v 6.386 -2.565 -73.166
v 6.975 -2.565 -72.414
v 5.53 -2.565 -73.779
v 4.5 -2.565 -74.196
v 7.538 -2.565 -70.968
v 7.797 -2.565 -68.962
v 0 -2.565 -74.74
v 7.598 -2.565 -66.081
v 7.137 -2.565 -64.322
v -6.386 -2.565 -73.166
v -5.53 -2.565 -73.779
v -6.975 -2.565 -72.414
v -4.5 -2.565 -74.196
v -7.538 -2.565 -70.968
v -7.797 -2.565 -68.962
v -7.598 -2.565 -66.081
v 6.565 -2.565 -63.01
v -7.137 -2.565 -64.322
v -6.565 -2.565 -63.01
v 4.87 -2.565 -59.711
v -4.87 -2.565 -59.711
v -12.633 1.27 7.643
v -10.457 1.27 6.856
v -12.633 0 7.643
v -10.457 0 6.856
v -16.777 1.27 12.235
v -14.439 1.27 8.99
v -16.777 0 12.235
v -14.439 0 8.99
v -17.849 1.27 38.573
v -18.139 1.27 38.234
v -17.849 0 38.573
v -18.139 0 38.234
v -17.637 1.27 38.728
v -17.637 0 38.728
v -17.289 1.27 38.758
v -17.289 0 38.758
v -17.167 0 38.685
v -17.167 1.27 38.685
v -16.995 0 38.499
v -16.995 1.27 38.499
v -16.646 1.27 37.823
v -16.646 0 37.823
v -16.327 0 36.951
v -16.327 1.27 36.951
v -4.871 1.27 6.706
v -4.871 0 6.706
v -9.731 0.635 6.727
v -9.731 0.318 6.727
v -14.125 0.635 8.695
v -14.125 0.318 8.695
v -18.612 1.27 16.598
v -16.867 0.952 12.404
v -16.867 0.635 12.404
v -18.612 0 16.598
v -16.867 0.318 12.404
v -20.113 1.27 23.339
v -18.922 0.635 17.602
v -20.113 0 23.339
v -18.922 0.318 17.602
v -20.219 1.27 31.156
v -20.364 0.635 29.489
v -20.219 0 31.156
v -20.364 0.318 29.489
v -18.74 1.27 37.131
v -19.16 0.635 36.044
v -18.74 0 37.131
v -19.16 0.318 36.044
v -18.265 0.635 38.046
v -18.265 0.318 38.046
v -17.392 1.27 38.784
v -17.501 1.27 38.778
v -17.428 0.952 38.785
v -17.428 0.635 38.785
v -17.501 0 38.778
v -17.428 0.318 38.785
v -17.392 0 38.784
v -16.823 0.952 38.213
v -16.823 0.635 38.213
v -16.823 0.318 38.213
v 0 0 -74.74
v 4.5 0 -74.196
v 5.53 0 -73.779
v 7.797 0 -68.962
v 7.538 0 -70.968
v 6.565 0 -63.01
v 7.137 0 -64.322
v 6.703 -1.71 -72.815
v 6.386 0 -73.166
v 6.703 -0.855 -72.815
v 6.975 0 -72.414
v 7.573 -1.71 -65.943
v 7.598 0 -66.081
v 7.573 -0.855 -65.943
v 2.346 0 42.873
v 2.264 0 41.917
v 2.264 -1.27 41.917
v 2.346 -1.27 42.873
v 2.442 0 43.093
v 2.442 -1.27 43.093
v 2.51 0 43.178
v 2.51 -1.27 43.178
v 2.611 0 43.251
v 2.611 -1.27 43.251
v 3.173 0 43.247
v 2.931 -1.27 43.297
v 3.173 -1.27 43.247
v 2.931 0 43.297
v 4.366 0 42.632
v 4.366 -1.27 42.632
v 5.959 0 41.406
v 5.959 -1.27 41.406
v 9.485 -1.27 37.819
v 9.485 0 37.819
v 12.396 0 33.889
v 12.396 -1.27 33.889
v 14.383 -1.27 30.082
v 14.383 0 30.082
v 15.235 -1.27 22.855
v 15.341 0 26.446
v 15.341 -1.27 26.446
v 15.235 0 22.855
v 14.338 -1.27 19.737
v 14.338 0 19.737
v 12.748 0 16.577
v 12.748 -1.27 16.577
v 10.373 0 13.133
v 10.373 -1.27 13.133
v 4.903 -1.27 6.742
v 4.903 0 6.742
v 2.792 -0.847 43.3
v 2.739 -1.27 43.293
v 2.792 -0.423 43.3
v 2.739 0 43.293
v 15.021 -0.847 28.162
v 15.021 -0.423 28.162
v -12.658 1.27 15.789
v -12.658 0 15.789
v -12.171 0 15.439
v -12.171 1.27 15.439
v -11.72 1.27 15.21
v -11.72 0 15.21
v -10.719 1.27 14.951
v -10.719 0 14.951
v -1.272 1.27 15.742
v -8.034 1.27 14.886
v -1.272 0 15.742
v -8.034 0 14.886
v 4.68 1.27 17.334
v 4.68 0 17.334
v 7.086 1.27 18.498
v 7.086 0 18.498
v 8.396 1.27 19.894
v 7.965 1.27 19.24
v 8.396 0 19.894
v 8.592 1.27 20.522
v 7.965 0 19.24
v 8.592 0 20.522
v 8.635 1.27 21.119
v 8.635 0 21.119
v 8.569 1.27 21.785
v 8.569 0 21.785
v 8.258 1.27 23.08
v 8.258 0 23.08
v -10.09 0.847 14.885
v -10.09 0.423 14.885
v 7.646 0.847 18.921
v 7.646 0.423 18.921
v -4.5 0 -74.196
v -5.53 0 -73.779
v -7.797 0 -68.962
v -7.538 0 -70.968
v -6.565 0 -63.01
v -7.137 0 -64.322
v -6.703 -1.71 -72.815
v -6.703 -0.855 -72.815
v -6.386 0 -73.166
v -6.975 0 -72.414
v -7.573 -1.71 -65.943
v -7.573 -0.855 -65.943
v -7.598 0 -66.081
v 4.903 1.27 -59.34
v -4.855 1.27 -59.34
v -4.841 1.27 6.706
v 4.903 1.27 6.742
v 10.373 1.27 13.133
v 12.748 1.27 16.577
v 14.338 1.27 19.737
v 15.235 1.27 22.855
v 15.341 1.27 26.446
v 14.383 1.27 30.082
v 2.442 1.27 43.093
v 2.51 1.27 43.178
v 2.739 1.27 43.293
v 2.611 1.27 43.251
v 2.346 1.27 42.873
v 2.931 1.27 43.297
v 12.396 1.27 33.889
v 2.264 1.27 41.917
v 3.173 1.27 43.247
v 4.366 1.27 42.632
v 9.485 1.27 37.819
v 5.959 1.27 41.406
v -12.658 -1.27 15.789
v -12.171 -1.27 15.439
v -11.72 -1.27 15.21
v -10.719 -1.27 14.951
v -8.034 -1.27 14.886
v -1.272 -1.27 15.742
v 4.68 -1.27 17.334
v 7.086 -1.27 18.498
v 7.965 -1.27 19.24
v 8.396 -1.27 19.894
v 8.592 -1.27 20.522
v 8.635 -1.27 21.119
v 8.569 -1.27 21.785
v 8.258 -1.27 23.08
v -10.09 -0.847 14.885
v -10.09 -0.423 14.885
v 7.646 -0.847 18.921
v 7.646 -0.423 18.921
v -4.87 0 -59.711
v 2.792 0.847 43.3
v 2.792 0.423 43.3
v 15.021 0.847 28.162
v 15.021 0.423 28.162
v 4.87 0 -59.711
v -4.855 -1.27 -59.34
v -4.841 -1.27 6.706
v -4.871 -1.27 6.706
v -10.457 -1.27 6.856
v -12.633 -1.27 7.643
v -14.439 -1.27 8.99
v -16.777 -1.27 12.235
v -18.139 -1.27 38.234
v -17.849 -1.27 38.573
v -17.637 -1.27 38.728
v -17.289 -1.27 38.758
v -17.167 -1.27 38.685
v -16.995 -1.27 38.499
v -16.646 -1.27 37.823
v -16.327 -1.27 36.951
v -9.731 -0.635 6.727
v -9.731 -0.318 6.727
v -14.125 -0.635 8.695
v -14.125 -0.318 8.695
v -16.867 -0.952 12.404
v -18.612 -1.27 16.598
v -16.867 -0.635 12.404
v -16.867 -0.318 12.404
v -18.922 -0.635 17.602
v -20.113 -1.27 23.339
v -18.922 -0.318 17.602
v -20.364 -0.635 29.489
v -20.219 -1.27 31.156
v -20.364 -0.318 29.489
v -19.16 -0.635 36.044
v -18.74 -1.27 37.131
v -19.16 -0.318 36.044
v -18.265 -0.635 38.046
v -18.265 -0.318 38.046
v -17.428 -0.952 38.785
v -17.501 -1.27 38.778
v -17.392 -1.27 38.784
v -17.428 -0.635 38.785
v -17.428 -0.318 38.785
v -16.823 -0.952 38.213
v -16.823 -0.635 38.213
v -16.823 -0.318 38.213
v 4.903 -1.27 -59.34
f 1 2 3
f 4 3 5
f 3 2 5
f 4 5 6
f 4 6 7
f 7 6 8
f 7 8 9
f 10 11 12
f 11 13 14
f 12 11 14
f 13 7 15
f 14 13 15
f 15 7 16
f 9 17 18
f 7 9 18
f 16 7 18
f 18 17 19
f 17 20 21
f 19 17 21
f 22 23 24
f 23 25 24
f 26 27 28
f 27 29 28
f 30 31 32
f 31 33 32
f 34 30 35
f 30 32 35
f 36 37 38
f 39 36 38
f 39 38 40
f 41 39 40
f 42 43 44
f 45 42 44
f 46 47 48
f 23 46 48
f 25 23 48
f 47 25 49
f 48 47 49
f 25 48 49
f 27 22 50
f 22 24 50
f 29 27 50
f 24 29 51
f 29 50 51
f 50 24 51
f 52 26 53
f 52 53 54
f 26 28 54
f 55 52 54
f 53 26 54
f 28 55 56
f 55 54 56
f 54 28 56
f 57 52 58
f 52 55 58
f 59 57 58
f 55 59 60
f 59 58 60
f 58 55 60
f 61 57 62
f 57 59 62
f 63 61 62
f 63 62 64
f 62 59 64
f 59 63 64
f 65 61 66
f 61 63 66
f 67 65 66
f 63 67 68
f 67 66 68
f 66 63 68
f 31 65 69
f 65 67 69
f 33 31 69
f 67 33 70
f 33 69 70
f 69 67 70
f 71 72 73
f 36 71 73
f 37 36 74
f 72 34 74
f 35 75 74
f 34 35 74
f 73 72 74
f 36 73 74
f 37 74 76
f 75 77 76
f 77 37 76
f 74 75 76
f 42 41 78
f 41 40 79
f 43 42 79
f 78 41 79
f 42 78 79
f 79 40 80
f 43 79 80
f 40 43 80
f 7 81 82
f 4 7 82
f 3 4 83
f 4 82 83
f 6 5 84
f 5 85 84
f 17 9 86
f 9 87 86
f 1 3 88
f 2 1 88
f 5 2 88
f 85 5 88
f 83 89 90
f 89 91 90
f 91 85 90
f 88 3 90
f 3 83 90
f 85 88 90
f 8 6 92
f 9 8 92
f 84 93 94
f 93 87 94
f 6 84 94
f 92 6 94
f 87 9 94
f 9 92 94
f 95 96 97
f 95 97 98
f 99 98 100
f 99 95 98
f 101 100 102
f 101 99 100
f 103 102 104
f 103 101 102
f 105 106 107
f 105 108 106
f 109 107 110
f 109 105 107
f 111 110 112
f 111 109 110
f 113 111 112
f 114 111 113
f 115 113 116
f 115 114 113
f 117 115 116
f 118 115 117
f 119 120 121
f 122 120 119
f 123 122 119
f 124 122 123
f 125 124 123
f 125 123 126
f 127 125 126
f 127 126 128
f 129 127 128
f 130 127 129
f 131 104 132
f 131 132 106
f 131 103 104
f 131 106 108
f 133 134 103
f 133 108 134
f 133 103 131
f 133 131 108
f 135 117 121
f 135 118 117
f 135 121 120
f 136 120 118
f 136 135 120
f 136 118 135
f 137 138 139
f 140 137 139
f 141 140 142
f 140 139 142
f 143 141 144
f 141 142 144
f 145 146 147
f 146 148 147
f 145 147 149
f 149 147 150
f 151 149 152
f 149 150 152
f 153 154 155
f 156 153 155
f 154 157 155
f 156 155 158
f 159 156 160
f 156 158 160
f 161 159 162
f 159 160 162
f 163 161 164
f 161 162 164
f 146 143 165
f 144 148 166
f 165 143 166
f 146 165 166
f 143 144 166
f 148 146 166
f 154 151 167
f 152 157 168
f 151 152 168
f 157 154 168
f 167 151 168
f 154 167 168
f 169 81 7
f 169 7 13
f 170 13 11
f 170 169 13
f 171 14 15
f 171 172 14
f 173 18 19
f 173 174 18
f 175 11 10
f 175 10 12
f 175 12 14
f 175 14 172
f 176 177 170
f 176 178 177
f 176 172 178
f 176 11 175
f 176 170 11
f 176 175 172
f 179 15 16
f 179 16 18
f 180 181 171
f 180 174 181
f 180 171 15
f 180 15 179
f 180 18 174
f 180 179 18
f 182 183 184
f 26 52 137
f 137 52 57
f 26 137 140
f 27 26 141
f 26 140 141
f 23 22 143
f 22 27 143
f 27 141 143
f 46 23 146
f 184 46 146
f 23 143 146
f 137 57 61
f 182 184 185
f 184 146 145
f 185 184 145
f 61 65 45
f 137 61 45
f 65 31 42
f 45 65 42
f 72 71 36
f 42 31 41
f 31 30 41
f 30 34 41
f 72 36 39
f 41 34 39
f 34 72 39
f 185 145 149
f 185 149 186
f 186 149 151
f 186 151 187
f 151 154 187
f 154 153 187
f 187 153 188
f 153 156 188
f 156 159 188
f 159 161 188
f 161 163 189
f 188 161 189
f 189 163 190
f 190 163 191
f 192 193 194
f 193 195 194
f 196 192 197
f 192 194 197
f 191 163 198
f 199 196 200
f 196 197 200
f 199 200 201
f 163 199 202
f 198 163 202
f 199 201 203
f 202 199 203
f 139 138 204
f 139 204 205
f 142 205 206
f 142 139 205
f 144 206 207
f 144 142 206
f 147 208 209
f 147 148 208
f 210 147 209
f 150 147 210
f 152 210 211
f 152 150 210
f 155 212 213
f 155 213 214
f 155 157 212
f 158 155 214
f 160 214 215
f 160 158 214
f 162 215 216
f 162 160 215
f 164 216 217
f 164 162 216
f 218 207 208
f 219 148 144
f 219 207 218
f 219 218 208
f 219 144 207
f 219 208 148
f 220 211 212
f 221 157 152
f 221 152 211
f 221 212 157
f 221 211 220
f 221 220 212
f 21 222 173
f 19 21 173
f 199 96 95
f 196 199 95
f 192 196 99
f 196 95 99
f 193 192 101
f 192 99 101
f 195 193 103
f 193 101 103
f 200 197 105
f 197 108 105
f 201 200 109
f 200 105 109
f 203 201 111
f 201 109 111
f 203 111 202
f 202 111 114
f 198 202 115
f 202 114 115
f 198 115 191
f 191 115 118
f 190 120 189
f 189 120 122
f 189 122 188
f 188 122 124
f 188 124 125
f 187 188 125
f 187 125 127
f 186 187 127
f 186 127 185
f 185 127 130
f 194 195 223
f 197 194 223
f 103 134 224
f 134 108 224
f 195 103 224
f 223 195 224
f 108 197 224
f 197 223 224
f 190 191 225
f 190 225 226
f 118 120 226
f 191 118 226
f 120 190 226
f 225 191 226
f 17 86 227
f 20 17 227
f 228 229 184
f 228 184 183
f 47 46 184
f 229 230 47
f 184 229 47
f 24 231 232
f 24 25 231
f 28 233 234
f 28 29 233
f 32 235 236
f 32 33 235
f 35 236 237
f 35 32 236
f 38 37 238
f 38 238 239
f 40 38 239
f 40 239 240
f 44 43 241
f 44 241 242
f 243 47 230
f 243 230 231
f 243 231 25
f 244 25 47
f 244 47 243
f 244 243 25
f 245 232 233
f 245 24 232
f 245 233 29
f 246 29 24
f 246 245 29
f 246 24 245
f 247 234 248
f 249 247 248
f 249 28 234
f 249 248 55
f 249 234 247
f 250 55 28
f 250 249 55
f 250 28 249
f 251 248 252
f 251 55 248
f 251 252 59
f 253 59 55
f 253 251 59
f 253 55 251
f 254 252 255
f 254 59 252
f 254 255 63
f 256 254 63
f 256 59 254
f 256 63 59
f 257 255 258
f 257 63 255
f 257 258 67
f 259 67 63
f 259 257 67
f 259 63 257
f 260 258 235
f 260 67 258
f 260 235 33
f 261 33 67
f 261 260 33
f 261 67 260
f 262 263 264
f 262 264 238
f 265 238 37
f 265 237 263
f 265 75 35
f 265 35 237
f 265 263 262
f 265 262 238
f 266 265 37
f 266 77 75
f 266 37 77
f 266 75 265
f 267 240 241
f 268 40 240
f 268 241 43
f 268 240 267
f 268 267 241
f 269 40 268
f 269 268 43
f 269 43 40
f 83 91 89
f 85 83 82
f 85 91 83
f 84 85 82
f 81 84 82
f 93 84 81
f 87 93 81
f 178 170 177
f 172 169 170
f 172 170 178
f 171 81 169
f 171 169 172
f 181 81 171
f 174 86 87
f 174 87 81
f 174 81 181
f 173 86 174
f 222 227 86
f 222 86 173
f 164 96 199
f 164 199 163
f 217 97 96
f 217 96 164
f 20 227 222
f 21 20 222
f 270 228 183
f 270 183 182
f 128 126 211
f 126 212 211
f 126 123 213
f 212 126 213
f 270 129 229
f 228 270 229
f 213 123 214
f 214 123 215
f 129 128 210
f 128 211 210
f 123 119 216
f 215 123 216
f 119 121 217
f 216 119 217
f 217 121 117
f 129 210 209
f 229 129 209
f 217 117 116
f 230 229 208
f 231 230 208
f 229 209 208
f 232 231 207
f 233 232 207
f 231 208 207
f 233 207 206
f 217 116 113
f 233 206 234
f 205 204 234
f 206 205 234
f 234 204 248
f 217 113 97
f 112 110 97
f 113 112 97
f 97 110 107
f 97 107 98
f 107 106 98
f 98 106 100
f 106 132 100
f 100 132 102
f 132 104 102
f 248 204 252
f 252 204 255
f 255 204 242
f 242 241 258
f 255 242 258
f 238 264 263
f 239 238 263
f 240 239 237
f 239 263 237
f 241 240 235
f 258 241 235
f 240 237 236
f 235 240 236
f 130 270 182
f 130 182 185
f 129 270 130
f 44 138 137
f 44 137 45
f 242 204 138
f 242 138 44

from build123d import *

# Parameters (mm, degrees)
F0_R     = 4.1276908543
F1_DEPTH = 2.5654
F3_DEPTH = 1.27
F5_DEPTH = 1.27


with BuildPart() as f1:
    # F0 (on Front) → F1 (new body)
    with BuildSketch(Plane.XZ):
        with BuildLine():
            add(Edge.make_bspline(
                [(0, -74.7398287058), (-2.6957496567, -74.6143655928), (-8.0783391659, -74.3638540389), (-7.896167718, -65.7972104685), (-6.9462192909, -63.8078220004), (-6.5654343925, -63.0103796721)],
                knots=[0, 0, 0, 0, 0.3754445557, 0.7496482182, 1, 1, 1, 1], degree=3))
            add(Edge.make_bspline(
                [(0, -74.7398287058), (2.6957496567, -74.6143655928), (8.0783391659, -74.3638540389), (7.896167718, -65.7972104685), (6.9462192909, -63.8078220004), (6.5654343925, -63.0103796721)],
                knots=[0, 0, 0, 0, 0.3754445557, 0.7496482182, 1, 1, 1, 1], degree=3))
            Line((6.5654343925, -63.0103796721), (4.8701618798, -59.7114712))
            Line((4.8701618798, -59.7114712), (-4.8701618798, -59.7114712))
            Line((-4.8701618798, -59.7114712), (-6.5654343925, -63.0103796721))
        make_face()
        with Locations((0, -69.3332850933)):
            Circle(F0_R, mode=Mode.SUBTRACT)
        with Locations((0, -69.3332850933)):
            Circle(F0_R)
    extrude(amount=F1_DEPTH)


with BuildPart() as f3:
    # F2 (on Front) → F3 (new body, symmetric)
    with BuildSketch(Plane.XZ):
        with BuildLine():
            add(Edge.make_bspline(
                [(-4.870638717, 6.7057721317), (-8.1624512163, 6.5038067464), (-16.4394258345, 5.9959824496), (-22.5493572738, 28.3095871952), (-17.6429563519, 40.7485223081), (-16.6454227734, 37.8691800893), (-16.3271799684, 36.950584501)],
                knots=[0, 0, 0, 0, 0.249708204, 0.6278694387, 0.8812793111, 1, 1, 1, 1], degree=3))
            add(Edge.make_bspline(
                [(-4.870638717, 6.7057721317), (-1.623546239, 6.7057721317), (1.623546239, 6.7057721317), (4.870638717, 6.7057721317)],
                knots=[0, 0, 0, 0, 9.7412774339, 9.7412774339, 9.7412774339, 9.7412774339], degree=3))
            add(Edge.make_bspline(
                [(2.2639525123, 41.9173613191), (2.2710740065, 42.5878349979), (2.3040198395, 45.6896157741), (22.5820118952, 26.3698101383), (10.966536241, 13.473737517), (4.870638717, 6.7057721317)],
                knots=[0, 0, 0, 0, 0.115859603, 0.5359958199, 1, 1, 1, 1], degree=3))
            Line((2.2639525123, 41.9173613191), (8.2576228306, 23.0801068246))
            add(Edge.make_bspline(
                [(-12.6575846225, 15.7892536372), (-12.1429601945, 15.3891007015), (-10.2979839458, 13.9545153574), (9.8990015791, 17.1438520791), (8.6599021449, 21.6252125837), (8.2576228306, 23.0801068246)],
                knots=[0, 0, 0, 0, 0.2071333369, 0.7425922015, 1, 1, 1, 1], degree=3))
            Line((-12.6575846225, 15.7892536372), (-16.3271799684, 36.950584501))
        make_face()
    extrude(amount=F3_DEPTH, both=True)

    # F4 (on Front) → F5 (join, symmetric)
    with BuildSketch(Plane.XZ):
        Polygon((4.903475754, 6.7454921082), (-4.8410594463, 6.7454921082), (-4.8548677005, -59.3397207558), (4.903475754, -59.3397207558), align=None)
    extrude(amount=F5_DEPTH, both=True)


solid = Compound([f1.part, f3.part])
